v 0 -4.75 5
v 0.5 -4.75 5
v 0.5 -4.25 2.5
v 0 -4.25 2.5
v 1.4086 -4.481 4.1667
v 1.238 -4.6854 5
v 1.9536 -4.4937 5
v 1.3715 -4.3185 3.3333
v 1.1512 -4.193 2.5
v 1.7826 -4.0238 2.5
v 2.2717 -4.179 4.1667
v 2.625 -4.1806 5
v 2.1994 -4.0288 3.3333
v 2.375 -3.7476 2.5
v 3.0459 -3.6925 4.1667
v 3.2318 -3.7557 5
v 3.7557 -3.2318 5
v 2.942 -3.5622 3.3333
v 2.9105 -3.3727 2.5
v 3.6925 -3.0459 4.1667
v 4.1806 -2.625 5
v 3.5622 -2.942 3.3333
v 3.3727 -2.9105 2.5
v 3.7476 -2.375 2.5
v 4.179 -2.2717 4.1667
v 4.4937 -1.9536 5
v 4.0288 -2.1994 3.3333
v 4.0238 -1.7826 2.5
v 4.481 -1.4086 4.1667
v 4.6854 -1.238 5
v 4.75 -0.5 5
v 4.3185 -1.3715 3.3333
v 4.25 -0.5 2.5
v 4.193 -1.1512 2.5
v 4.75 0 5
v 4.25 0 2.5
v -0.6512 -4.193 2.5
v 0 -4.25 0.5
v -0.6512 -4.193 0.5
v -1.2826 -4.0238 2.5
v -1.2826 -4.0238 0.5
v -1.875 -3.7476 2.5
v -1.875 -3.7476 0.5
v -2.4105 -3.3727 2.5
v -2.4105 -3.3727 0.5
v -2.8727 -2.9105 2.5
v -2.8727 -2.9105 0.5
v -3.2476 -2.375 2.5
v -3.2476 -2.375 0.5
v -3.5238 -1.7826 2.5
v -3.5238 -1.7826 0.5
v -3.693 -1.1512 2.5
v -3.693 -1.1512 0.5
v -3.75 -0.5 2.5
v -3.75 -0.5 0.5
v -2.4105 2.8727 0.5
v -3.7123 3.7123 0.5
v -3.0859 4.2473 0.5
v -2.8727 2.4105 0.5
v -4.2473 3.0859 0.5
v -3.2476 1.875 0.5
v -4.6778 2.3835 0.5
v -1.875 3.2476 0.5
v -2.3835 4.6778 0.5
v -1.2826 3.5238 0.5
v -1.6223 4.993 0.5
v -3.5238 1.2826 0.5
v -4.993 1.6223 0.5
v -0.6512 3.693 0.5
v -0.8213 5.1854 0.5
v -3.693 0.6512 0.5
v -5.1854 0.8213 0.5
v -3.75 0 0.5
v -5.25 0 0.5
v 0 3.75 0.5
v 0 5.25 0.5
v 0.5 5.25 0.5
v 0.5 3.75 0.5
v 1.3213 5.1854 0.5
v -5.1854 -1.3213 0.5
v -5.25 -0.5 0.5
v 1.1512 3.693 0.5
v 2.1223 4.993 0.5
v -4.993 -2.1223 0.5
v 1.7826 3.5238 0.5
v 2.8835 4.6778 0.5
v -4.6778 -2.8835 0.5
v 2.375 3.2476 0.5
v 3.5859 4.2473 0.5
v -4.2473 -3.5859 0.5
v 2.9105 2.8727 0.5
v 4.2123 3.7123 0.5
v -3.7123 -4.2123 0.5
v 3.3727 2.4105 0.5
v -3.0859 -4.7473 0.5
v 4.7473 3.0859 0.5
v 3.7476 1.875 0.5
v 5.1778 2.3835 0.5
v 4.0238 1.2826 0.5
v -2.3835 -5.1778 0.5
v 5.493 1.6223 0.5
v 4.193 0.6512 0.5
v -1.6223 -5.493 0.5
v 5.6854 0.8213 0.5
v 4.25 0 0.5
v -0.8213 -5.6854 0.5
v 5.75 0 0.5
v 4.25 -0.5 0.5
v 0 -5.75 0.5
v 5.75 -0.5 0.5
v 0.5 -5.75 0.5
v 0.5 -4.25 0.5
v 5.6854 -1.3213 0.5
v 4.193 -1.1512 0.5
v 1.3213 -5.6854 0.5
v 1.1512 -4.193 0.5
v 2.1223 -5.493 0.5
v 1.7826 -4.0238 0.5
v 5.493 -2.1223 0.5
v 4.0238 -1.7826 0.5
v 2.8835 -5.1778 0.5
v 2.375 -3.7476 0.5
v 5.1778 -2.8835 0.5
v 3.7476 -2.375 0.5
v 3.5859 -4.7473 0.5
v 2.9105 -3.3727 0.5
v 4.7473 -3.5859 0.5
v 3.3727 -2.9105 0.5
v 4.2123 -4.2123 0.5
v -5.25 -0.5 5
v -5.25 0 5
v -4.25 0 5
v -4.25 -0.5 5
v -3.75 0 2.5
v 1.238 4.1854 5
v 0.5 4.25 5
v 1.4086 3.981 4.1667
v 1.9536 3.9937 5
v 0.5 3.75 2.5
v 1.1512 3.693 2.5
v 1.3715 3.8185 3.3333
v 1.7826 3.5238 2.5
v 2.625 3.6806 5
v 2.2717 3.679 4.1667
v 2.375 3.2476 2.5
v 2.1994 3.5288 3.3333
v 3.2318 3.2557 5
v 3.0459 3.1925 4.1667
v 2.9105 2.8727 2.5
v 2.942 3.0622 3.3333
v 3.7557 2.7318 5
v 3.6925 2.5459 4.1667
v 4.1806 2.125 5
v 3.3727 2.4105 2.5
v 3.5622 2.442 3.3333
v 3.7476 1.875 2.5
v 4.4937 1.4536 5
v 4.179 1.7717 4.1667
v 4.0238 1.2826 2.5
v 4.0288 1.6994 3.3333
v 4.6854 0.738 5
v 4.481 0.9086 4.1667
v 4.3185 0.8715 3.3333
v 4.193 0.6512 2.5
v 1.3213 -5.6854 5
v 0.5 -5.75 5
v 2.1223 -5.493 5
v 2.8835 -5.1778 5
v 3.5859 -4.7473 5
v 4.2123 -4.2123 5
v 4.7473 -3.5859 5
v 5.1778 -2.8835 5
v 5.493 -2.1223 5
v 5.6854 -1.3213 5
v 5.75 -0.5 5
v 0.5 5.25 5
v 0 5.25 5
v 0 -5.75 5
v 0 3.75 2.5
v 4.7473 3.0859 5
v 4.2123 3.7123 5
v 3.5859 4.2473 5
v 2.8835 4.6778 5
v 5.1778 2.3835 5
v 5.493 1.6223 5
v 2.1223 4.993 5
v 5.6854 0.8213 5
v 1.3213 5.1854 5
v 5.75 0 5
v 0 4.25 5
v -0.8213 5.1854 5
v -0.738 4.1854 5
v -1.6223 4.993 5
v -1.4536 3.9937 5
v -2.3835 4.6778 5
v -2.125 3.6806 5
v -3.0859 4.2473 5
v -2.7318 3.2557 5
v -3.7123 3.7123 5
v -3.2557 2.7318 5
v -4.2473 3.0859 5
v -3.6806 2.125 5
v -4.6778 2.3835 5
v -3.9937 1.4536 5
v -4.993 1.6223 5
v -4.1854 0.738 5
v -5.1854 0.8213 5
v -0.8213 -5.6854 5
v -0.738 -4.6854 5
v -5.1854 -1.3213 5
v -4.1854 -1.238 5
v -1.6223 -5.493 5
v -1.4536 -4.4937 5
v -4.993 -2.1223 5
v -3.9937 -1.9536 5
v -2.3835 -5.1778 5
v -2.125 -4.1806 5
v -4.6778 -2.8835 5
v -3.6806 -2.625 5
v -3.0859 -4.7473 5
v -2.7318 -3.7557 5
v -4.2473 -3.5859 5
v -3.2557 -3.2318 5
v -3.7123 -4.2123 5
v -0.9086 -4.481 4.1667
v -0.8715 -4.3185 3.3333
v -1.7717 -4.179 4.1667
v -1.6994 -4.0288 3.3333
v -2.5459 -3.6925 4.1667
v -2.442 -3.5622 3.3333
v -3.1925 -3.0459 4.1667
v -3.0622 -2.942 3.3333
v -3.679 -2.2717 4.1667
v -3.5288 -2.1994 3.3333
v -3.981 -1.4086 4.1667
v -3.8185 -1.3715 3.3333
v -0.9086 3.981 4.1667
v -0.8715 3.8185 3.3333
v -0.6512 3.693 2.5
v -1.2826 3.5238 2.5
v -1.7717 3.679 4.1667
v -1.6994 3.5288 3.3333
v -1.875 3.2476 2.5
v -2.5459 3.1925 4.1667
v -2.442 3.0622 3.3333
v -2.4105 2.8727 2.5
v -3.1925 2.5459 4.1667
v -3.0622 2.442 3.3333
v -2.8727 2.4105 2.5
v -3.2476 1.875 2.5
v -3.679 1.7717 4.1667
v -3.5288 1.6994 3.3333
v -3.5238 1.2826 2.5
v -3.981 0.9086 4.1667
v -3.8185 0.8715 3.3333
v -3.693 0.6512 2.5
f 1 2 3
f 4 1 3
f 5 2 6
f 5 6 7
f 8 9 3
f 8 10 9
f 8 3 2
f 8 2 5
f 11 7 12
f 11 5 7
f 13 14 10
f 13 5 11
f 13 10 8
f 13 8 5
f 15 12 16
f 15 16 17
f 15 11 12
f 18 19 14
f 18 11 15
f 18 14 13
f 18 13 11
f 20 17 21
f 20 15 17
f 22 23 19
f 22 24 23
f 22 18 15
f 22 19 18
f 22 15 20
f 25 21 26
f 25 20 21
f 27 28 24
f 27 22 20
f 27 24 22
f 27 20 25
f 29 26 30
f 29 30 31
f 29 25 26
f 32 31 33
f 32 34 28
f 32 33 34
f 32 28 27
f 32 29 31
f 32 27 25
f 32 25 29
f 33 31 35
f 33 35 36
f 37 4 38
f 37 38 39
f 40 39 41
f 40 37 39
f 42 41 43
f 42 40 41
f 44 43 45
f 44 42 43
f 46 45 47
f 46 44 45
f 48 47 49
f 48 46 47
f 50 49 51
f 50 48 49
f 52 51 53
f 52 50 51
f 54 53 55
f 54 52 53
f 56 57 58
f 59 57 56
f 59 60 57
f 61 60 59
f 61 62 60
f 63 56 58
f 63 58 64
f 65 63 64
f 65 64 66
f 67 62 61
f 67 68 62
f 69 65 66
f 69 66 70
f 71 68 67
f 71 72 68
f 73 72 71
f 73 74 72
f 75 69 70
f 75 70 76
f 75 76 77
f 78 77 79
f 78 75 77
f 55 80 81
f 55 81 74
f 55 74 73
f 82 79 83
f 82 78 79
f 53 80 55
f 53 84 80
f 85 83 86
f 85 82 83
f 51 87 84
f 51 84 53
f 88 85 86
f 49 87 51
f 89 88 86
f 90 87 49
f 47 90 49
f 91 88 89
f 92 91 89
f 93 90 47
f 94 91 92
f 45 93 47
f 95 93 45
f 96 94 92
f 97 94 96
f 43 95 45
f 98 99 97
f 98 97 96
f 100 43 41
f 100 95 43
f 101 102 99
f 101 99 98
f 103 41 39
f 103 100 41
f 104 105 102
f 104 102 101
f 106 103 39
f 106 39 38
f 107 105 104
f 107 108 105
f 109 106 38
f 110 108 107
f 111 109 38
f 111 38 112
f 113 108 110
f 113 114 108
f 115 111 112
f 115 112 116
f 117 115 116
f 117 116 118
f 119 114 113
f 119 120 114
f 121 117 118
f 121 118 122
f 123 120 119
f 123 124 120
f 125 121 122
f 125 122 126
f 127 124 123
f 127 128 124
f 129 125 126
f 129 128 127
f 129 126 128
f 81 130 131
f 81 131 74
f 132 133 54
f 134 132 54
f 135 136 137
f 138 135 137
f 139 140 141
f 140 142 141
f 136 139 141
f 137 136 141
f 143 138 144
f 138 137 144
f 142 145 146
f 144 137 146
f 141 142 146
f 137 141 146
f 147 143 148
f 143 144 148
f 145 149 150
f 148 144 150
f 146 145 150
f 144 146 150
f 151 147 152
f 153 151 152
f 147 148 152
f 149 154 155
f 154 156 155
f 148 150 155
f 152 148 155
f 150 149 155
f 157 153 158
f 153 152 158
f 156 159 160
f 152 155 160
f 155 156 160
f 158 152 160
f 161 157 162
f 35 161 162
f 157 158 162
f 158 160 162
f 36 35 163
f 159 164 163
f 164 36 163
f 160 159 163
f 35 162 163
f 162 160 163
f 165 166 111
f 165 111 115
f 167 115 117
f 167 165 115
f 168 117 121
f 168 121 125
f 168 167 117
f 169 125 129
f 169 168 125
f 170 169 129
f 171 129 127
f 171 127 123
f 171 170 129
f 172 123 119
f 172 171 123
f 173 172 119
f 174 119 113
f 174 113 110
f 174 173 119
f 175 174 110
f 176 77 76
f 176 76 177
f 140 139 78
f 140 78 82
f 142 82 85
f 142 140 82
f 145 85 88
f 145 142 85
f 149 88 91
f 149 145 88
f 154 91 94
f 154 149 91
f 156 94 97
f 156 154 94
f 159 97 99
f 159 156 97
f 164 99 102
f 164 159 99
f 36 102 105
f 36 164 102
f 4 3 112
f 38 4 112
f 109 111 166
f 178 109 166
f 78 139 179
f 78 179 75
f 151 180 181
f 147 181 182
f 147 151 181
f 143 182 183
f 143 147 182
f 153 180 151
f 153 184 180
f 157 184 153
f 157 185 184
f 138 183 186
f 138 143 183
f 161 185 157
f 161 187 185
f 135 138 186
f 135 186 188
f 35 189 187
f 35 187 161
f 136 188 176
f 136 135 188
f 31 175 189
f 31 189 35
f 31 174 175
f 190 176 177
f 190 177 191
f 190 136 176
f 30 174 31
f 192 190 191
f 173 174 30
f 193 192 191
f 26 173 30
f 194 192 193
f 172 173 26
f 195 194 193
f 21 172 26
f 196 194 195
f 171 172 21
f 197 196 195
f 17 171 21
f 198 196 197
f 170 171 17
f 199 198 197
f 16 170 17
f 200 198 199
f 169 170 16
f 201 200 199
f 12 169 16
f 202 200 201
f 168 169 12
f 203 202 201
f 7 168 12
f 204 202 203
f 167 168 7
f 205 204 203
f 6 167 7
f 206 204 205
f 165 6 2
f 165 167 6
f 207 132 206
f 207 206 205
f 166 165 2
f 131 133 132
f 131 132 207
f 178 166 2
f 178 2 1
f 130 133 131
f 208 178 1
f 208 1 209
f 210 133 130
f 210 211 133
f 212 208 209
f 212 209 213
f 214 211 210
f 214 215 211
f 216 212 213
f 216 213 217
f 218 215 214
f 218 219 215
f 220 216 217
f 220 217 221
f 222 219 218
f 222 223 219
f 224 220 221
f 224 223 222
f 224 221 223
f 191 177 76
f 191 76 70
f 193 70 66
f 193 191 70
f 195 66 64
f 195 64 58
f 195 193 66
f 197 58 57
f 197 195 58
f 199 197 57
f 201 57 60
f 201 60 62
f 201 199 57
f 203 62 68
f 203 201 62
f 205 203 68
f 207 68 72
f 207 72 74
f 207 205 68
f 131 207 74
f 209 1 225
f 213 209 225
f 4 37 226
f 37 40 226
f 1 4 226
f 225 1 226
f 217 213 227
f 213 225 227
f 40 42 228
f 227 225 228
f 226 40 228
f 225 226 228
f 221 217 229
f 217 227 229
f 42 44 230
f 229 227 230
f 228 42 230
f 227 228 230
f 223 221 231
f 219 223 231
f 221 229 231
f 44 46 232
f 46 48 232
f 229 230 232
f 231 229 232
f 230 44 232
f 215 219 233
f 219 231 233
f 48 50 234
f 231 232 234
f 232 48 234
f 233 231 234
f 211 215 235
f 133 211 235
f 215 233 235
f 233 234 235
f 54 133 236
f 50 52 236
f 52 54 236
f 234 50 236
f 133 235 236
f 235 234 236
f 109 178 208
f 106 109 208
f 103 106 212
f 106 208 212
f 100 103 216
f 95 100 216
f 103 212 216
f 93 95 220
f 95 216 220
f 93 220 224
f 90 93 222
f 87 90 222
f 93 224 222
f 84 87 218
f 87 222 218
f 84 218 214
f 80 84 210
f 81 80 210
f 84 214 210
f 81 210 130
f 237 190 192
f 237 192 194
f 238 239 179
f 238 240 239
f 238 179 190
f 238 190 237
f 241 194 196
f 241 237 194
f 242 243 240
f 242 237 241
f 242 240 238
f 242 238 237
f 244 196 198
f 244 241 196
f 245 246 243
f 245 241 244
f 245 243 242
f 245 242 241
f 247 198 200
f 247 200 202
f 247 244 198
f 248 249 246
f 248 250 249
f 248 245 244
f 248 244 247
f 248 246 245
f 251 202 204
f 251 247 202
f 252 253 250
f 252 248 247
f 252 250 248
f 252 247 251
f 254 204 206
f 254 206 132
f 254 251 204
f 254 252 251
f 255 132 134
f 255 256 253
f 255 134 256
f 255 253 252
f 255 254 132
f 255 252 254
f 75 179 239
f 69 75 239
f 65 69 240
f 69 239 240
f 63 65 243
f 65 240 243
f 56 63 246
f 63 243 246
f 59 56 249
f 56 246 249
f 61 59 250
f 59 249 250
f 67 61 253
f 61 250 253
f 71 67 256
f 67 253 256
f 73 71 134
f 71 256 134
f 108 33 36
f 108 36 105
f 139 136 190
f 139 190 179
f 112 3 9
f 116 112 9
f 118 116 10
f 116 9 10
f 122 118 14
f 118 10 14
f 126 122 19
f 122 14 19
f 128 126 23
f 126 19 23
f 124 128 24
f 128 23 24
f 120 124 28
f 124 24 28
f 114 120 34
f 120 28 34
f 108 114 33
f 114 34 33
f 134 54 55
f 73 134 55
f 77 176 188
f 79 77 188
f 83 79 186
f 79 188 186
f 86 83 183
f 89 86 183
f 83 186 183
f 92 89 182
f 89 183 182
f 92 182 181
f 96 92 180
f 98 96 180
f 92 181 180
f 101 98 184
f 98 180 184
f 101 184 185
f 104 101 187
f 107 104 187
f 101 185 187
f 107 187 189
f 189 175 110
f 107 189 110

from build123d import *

# Parameters (mm, degrees)
F1_ANGLE = 90
F2_DEPTH = 2
F3_DEPTH = 0.25
F4_DEPTH = 0.25


with BuildPart() as f1:
    # F0 (on Right) → F1 (revolve)
    with BuildSketch(Plane.YZ):
        Polygon((4.25, 5), (3.75, 2.5), (5.25, 2.5), (5.25, 5), align=None)
    revolve(axis=Axis((0, 0, 2.5), (0, 0, 1)), revolution_arc=F1_ANGLE)

    # F2 (add): a face of the model
    f2_faces = [f1.faces().sort_by_distance(p)[0] for p in [
        (-2.8913147995, 2.8913147995, 2.5),
    ]]
    extrude(f2_faces, amount=F2_DEPTH)

    # F3 (add): a face of the model
    f3_faces = [f1.faces().sort_by_distance(p)[0] for p in [
        (0, 4.5595238095, 2.6054421769),
    ]]
    extrude(f3_faces, amount=F3_DEPTH)

    # F4 (add): a face of the model
    f4_faces = [f1.faces().sort_by_distance(p)[0] for p in [
        (-4.5595238095, 0, 2.6054421769),
    ]]
    extrude(f4_faces, amount=F4_DEPTH)

    # F5: F1 across face


with BuildPart() as f1_1:
    add(f1.part)
    add(f1.part.mirror(Plane(origin=(-4.5595238095, -0.25, 2.6054421769), x_dir=(1, 0, 0), z_dir=(0, -1, 0))))

    # F6: F1 across face


with BuildPart() as f1_2:
    add(f1_1.part)
    add(f1_1.part.mirror(Plane(origin=(0.25, -5.0595238095, 2.6054421769), x_dir=(0, 1, 0), z_dir=(1, 0, 0))))


solid = f1_2.part
